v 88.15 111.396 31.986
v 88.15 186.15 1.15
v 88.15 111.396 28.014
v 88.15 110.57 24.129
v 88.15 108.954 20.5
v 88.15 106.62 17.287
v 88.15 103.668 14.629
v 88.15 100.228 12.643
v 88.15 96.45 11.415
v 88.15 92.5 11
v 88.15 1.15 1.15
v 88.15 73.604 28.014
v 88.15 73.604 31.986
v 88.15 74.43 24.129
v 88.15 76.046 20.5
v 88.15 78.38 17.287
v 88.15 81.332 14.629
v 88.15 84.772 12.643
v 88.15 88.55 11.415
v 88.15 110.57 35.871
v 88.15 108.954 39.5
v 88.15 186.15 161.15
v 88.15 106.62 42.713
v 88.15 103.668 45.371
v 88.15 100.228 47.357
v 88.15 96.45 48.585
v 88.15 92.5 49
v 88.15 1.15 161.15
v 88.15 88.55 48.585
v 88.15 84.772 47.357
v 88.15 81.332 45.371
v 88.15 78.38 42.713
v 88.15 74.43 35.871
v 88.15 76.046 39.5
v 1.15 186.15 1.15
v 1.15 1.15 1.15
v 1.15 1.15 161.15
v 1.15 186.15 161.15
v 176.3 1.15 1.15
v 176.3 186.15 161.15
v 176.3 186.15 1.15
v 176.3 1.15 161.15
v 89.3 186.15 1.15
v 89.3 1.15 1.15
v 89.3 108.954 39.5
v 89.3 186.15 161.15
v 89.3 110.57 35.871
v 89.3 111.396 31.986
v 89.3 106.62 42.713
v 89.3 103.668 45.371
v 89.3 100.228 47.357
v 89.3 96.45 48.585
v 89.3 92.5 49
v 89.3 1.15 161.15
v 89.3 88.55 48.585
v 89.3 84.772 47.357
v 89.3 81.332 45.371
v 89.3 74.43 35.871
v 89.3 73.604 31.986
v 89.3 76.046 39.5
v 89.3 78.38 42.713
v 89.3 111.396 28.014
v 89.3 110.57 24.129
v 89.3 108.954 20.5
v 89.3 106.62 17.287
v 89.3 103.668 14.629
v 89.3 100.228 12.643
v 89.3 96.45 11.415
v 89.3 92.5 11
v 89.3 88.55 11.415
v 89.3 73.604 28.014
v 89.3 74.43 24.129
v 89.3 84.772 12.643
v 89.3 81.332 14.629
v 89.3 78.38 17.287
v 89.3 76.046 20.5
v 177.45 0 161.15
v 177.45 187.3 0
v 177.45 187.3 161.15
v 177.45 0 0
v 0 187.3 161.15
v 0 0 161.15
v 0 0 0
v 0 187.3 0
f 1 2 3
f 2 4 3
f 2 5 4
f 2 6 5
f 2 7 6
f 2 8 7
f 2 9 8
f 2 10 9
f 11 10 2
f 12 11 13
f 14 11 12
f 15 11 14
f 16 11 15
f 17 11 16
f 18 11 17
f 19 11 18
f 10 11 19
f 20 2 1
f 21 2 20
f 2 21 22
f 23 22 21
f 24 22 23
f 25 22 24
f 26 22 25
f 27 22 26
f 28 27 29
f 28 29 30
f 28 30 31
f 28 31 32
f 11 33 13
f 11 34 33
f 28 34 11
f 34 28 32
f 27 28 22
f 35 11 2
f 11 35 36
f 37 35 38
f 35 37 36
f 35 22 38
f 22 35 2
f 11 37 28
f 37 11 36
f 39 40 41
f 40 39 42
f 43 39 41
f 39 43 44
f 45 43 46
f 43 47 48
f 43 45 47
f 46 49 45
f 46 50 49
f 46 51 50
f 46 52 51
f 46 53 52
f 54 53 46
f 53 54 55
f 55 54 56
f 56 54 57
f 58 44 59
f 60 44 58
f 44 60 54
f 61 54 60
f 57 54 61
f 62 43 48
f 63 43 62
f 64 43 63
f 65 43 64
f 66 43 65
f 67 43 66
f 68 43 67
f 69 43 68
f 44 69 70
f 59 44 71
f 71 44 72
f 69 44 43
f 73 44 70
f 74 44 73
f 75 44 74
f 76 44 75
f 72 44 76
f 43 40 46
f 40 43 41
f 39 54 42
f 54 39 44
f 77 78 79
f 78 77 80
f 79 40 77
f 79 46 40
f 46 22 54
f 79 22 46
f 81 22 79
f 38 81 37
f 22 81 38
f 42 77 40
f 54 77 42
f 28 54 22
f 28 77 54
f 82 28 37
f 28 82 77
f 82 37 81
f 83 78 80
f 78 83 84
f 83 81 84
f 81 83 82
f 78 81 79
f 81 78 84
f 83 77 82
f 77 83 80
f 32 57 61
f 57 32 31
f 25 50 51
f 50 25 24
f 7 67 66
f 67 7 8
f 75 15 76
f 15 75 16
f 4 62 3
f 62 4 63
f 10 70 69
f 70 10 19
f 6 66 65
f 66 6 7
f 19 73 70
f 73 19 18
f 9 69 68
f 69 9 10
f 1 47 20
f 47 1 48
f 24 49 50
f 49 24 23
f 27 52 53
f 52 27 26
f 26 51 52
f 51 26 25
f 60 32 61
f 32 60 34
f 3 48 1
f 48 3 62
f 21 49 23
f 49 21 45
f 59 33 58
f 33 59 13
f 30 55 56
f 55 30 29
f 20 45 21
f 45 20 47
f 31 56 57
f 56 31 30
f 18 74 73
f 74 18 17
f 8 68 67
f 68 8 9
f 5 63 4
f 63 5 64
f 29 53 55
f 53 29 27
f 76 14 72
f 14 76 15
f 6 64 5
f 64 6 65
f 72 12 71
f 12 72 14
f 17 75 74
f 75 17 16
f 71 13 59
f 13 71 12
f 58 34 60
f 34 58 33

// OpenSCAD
compx = 87;	// Size of compartments, X
compy = 185;	// Size of compartments, Y
wall = 1.15;		// Width of wall
nox = 2;		// Number of compartments, X
noy = 1;		// Number of compartments, Y
deep = 160;		// Depth of compartments

tolerance=.05;	// Tolerance around lid.  If it's too tight, increase this. 
			// If it's too loose, decrease it.
lidoffset=3;		// This is how far away from the box to print the lid
lidheight=8;		// Height of lid (duh)
showlid=false;	// Whether or not to render the lid
showbox=true;	// Whether or not to render the box

if (showbox) {
difference() {
	cube ( size = [nox * (compx + wall) + wall, noy * (compy + wall) + wall, (deep + wall)], center = false);
    union() {
	for ( ybox = [ 0 : noy - 1])
		{
             for( xbox = [ 0 : nox - 1])
			{
			translate([ xbox * ( compx + wall ) + wall, ybox * ( compy + wall ) + wall, wall])
			cube ( size = [ compx, compy, deep+1 ]);
			}
		}
	};
    
    translate([compx, compy/2, 30])
    rotate ([0,90,0])
    cylinder (r=19, h=20, center=true);
}
}

if (showlid) {
translate ([0,noy*(compy+wall)+wall+lidoffset,0])
difference() {
	cube ( size = [nox * (compx + wall) + 3 * wall + 2* tolerance, noy * (compy + wall) + 3 * wall + 2*tolerance, lidheight], center = false);

	translate ([wall,wall,wall])
	cube ( size = [nox * (compx + wall) +wall+tolerance, noy * (compy + wall) + wall + tolerance, lidheight+1], center = false);
	}

}
